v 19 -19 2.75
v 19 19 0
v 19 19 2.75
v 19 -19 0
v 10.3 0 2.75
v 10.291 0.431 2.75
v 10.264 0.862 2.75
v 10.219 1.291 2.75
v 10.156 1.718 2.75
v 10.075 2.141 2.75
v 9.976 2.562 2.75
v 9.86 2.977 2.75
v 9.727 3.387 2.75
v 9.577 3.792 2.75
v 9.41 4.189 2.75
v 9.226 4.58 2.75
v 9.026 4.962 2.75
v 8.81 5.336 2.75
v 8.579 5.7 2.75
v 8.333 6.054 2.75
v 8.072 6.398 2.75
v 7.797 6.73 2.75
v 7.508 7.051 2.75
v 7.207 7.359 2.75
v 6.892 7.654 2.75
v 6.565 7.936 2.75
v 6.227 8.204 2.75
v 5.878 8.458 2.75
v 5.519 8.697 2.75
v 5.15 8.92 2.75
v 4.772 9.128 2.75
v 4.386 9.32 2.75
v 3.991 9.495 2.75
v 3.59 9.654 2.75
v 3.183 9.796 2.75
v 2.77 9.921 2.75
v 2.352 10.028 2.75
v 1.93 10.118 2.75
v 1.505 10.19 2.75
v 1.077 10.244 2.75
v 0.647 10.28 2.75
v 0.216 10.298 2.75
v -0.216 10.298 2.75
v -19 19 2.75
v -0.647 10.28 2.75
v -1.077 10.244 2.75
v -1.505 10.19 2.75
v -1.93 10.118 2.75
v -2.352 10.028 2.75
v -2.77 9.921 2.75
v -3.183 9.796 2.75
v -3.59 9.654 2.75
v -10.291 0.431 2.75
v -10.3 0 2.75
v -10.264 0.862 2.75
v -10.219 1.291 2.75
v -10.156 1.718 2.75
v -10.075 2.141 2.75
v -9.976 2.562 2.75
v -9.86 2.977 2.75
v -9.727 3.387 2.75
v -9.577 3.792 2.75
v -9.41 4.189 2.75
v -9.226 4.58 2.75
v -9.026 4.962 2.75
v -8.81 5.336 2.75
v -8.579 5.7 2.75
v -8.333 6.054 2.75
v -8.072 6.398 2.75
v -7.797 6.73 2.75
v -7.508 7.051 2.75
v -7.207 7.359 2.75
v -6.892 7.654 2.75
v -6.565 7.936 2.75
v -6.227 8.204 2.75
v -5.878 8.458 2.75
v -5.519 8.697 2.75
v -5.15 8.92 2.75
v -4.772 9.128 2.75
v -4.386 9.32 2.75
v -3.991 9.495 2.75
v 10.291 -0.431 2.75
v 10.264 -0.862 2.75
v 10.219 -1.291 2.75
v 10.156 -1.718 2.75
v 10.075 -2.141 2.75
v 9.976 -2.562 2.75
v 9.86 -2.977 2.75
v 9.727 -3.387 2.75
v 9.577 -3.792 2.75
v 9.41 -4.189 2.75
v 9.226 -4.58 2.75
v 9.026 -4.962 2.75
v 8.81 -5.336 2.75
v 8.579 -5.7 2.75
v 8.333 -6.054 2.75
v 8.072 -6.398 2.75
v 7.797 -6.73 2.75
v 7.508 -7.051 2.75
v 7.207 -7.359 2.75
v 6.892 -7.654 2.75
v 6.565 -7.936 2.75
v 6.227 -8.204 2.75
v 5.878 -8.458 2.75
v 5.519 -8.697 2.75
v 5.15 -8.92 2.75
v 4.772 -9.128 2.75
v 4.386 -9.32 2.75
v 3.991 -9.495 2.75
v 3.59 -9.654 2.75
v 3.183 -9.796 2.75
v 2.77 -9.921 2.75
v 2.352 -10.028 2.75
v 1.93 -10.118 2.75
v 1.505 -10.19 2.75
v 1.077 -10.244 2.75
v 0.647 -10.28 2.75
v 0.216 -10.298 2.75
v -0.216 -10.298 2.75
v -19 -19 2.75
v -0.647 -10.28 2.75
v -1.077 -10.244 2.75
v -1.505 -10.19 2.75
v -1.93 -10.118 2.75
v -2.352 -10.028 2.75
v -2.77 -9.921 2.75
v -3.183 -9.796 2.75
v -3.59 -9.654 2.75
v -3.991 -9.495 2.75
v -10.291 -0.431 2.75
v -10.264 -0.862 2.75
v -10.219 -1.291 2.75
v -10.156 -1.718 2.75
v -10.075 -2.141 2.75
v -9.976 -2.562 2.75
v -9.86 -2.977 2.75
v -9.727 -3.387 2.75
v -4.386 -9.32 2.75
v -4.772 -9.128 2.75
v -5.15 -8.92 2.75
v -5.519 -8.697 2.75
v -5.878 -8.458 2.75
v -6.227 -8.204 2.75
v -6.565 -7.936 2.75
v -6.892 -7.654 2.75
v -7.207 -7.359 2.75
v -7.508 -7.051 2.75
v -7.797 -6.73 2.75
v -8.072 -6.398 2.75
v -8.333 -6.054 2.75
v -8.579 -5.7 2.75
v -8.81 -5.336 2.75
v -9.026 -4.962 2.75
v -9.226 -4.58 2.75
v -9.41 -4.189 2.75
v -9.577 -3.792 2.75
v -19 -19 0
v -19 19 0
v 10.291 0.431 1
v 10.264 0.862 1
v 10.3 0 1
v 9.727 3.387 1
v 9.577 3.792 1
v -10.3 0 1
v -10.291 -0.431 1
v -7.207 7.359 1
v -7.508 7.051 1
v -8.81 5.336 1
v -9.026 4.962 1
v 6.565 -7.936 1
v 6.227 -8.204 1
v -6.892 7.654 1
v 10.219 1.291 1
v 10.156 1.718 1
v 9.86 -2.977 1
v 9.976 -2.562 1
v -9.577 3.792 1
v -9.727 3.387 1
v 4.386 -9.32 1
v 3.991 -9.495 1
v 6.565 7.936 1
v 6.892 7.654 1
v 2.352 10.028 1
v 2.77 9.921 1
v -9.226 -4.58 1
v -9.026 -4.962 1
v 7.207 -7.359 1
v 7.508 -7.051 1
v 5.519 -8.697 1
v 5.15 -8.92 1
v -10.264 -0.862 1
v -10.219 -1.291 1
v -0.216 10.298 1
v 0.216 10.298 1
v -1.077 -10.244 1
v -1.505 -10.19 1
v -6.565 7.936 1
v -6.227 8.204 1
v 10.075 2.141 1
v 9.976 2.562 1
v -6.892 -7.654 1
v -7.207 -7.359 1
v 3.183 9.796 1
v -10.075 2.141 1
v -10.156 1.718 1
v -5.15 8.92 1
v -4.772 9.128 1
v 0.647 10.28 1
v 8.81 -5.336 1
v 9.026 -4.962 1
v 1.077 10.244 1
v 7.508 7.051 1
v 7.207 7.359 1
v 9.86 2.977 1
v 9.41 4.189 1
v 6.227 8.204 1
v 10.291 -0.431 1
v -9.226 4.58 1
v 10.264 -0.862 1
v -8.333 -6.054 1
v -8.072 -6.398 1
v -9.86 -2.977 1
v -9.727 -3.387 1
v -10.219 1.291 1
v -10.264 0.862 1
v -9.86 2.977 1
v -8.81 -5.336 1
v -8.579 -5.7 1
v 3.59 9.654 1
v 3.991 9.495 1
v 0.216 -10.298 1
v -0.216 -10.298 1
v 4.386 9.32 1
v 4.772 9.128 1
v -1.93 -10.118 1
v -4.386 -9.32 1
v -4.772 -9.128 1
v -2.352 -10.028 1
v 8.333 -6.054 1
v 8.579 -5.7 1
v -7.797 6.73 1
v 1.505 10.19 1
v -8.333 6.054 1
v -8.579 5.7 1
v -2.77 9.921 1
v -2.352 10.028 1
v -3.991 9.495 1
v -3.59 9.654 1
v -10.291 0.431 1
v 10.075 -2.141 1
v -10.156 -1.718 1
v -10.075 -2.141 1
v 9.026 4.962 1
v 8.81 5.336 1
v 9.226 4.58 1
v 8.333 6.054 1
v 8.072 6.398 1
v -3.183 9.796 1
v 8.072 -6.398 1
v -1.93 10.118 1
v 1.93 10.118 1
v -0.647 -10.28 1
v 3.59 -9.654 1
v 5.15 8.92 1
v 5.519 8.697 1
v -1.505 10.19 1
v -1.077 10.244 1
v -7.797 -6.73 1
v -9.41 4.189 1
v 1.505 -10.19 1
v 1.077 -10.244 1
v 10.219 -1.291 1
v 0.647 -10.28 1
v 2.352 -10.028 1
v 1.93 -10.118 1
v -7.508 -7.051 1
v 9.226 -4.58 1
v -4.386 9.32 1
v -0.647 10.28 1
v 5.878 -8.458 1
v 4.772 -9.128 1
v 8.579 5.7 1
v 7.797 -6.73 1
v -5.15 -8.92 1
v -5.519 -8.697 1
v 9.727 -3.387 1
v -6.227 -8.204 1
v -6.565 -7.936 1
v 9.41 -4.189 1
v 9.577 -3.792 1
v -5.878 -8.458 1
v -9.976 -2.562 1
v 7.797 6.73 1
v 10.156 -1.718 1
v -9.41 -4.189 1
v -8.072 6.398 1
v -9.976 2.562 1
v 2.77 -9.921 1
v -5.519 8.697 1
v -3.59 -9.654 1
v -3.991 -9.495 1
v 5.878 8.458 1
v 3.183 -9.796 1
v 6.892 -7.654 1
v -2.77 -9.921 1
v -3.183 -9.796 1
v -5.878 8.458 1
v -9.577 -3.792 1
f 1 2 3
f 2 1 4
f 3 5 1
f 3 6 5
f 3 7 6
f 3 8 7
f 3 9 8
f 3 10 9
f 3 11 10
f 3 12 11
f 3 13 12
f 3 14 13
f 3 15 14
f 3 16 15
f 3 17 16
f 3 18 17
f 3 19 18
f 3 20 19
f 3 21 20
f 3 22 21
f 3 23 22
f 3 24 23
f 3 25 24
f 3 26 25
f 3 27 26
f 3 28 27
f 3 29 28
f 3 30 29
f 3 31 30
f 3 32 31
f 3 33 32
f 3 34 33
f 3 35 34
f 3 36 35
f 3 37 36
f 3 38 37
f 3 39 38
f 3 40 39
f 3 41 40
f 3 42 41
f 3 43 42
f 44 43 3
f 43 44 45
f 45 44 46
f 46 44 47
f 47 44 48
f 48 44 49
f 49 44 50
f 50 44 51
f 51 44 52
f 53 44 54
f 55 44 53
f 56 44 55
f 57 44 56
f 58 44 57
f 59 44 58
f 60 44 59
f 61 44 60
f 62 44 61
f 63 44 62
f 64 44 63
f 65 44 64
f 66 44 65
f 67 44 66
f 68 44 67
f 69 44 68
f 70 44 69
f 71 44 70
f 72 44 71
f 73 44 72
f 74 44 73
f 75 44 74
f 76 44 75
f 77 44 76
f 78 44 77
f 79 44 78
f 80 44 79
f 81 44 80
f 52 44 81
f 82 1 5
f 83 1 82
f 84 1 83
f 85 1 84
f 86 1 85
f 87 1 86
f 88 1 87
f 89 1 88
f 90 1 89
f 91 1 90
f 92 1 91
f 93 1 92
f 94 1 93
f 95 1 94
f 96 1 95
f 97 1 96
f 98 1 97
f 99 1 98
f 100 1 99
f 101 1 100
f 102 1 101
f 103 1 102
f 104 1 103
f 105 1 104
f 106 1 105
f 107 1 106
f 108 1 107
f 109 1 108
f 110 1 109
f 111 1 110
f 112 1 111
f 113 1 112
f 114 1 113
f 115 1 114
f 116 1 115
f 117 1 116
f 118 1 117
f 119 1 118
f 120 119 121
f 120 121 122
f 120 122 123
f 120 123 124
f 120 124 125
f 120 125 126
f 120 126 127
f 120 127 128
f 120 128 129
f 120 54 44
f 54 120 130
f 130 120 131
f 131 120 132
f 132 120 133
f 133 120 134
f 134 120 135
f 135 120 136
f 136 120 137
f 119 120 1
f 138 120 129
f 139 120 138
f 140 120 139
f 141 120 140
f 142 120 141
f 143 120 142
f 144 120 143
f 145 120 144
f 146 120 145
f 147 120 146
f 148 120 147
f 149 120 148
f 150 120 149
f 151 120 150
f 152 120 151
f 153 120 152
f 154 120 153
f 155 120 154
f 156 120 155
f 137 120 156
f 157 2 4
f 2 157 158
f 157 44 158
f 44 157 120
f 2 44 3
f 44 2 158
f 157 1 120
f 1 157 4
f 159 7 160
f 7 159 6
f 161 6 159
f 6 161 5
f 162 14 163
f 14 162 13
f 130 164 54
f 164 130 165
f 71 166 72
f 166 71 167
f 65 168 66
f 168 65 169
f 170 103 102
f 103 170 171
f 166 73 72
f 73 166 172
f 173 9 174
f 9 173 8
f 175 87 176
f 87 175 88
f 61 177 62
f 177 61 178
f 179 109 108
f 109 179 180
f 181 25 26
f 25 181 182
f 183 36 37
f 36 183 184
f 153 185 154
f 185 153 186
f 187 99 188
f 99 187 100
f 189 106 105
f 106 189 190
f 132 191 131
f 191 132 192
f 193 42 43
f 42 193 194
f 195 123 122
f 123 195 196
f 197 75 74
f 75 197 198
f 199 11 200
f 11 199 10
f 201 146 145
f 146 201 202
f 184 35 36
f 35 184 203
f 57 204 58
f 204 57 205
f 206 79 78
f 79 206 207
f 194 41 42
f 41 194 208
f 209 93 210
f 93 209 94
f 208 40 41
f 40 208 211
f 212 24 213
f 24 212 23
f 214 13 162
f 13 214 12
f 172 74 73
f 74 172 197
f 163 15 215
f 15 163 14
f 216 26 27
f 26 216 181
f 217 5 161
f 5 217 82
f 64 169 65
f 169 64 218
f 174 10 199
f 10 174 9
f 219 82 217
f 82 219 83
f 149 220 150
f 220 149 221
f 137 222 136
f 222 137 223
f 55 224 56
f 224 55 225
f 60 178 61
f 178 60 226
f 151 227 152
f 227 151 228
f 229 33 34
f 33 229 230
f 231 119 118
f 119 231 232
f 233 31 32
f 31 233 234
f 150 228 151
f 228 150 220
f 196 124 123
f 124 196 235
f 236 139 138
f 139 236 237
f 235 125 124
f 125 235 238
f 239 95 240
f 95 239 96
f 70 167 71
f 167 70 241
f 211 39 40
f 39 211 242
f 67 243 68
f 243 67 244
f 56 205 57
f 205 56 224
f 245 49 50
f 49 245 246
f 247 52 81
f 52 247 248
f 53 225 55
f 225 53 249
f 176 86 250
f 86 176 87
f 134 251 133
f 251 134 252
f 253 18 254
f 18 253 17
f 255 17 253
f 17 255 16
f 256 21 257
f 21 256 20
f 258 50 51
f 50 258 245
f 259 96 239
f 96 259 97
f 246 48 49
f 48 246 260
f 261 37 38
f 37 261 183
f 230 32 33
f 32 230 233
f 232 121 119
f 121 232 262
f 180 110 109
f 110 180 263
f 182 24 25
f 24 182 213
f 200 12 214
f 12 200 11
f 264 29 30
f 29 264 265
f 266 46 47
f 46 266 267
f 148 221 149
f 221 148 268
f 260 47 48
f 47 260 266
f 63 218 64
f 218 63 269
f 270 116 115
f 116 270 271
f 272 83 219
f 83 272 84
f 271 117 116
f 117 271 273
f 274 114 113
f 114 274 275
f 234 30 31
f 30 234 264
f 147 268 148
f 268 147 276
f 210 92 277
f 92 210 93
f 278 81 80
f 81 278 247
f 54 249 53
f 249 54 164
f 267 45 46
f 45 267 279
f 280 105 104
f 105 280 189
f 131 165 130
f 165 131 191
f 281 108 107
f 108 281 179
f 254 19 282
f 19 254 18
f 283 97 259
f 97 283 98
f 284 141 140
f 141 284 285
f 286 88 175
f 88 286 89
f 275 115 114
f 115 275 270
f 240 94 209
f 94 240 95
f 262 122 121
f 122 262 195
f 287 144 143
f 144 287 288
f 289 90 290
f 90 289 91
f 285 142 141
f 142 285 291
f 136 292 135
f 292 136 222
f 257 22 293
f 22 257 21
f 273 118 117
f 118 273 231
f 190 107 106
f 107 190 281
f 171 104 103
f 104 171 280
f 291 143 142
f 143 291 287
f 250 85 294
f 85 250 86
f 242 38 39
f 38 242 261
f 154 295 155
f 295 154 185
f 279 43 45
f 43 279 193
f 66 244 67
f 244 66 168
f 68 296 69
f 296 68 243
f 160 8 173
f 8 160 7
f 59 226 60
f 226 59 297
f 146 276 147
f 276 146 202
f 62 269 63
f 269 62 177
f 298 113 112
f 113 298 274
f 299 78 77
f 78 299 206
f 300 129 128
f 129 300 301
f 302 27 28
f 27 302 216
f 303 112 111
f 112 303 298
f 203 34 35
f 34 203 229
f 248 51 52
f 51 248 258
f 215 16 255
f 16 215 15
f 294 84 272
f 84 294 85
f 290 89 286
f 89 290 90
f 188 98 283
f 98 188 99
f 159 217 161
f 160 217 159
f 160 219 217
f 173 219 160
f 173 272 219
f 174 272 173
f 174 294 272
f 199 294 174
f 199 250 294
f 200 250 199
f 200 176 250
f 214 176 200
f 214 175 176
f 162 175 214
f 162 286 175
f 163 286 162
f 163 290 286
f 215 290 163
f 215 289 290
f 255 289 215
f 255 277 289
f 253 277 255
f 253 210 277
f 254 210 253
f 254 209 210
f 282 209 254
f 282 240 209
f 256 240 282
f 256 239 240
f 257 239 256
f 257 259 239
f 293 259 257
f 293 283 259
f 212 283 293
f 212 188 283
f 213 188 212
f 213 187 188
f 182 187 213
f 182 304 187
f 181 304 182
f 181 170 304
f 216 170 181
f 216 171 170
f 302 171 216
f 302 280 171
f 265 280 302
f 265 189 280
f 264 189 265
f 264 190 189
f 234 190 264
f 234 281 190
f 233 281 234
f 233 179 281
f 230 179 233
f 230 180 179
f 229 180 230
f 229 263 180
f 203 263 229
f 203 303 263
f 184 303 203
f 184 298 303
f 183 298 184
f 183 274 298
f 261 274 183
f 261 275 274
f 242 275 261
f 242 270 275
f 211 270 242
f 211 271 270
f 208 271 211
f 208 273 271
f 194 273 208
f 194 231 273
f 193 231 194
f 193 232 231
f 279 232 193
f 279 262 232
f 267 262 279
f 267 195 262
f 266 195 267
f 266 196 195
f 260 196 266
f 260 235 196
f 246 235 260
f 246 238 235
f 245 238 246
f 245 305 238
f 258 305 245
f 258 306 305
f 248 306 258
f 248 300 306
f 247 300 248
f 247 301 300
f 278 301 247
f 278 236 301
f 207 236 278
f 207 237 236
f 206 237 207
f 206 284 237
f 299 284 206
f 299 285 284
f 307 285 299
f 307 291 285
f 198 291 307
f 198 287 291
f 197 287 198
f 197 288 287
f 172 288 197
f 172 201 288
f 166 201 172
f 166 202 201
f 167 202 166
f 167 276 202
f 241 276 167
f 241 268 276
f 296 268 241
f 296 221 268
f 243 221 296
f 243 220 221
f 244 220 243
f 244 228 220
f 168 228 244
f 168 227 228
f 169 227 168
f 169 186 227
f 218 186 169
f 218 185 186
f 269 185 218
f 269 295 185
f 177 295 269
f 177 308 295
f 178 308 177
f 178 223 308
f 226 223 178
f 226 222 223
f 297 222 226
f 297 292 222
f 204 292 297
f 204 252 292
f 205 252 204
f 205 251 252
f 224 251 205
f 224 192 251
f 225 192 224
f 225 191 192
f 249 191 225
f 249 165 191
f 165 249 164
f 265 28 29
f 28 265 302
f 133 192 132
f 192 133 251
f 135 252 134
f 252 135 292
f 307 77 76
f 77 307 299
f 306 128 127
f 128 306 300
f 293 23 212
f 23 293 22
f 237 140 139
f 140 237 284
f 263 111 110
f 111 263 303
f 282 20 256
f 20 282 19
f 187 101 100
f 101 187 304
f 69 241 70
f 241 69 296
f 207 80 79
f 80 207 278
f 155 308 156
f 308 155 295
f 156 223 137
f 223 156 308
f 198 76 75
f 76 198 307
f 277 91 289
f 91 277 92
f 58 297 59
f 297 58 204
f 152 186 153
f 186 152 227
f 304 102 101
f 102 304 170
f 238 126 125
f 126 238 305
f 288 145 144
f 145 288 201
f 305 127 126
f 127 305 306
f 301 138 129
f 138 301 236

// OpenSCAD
$fn = 150;

difference() {
	translate(v = [-19.0, -19.0, 0]) {
		cube(size = [38.0, 38.0, 2.75]);
	}
	translate(v = [0, 0, 1.0]) {
		cylinder(d = 20.6, h = 2.75);
	}
}
